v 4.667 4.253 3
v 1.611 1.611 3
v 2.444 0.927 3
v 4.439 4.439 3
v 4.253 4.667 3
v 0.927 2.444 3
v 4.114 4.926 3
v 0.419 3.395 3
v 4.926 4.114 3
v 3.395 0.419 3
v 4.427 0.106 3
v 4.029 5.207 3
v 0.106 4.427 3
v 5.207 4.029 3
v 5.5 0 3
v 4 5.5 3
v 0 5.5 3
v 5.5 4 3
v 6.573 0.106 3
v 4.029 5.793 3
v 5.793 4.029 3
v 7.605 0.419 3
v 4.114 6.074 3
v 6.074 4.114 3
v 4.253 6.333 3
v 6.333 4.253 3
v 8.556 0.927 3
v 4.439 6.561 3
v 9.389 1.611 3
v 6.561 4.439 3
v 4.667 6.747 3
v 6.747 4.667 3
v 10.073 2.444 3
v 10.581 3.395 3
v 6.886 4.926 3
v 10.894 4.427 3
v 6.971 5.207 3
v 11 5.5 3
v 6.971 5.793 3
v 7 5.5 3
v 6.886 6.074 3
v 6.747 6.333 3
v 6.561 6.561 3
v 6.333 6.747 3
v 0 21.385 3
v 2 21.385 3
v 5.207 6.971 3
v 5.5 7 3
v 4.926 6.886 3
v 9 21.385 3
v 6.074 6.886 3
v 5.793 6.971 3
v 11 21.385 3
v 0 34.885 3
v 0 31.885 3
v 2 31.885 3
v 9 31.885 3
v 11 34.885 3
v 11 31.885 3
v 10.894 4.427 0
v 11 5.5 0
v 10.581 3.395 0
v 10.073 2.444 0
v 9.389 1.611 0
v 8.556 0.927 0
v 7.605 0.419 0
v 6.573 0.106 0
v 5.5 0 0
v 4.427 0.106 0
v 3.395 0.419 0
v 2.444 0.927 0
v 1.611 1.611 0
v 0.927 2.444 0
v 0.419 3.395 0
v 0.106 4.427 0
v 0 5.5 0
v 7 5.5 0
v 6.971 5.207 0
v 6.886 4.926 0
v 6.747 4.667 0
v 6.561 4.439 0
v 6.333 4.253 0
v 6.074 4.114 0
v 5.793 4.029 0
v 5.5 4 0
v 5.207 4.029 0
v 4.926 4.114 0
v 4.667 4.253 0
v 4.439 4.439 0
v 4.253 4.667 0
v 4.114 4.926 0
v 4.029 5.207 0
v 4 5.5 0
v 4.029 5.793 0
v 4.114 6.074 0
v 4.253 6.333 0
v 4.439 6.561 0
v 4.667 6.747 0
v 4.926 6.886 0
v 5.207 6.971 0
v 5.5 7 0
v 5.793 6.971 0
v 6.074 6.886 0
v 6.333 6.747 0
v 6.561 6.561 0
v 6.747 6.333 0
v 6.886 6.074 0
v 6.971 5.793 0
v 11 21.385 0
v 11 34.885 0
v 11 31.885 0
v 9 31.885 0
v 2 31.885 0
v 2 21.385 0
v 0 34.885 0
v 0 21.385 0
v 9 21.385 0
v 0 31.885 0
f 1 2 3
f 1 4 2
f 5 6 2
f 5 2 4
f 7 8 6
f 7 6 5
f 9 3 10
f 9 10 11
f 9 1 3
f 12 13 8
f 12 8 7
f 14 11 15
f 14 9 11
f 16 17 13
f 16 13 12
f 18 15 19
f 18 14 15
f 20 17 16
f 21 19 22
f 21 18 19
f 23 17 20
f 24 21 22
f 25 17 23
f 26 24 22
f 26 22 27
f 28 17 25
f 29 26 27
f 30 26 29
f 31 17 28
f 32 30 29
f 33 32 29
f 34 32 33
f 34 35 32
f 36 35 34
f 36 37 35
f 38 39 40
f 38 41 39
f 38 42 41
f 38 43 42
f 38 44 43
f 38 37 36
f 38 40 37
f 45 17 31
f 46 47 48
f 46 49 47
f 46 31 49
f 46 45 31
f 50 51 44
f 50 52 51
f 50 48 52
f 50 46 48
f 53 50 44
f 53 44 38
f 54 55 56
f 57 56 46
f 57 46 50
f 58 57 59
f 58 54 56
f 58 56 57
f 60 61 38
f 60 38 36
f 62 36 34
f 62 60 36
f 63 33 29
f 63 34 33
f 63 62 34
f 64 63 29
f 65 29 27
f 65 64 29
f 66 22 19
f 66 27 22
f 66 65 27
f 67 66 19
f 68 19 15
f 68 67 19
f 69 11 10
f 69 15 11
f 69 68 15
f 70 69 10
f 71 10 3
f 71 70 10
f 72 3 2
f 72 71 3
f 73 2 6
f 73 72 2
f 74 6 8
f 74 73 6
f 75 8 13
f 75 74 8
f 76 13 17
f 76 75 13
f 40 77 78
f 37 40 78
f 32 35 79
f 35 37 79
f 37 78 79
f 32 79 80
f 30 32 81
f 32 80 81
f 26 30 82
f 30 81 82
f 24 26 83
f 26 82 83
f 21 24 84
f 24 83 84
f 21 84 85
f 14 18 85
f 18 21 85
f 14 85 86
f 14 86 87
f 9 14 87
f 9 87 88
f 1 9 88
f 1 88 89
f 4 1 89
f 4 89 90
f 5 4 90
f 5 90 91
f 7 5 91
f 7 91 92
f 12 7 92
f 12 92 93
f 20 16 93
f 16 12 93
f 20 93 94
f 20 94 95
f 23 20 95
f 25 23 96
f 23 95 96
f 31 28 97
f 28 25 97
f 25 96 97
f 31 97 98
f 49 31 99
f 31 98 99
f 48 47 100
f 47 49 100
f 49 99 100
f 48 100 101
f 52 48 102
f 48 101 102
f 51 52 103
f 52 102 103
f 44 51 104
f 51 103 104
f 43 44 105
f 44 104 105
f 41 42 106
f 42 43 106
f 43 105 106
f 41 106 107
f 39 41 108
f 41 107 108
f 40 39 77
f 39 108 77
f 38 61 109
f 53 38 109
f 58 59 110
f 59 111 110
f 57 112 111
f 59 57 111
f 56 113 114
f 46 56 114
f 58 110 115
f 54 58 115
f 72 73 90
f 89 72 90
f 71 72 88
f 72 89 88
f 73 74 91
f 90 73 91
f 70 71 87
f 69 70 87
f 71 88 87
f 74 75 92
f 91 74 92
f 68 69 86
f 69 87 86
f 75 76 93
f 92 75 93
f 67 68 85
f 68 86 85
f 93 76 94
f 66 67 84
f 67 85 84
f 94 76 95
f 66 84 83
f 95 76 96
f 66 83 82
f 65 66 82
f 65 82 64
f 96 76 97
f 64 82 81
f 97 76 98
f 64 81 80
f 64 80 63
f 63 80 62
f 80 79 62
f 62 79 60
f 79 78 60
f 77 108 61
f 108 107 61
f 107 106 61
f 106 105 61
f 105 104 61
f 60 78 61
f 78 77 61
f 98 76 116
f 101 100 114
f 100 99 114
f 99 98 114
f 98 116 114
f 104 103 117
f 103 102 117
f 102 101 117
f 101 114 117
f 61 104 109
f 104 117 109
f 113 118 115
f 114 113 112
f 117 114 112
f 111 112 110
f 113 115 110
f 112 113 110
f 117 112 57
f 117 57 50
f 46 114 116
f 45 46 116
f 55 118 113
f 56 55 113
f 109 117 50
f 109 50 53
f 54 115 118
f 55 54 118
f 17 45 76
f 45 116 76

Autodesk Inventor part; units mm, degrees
ref_plane "YZ Plane" through (0, 0, 0) normal (1, 0, 0) x (0, 1, 0)
ref_plane "XZ Plane" through (0, 0, 0) normal (0, 1, 0) x (-1, 0, 0)
ref_plane "XY Plane" through (0, 0, 0) normal (0, 0, 1) x (1, 0, 0)
sketch "Sketch6" plane through (0, 0, 0) normal (0, 0, 1) x (1, 0, 0)
  line L0 (11, 34.8851) -> (0, 34.8851)
  line L1 (2, 31.8851) -> (2, 21.3851)
  line L2 (9, 31.8851) -> (9, 21.3851)
  line L3 (2, 21.3851) -> (0, 21.3851)
  line L4 (9, 21.3851) -> (11, 21.3851)
  arc A0 (0, 5.5) -> (11, 5.5) centre (5.5, 5.5) ccw
  circle A1 centre (5.5, 5.5) radius 1.5
  line L5 (0, 31.8851) -> (2, 31.8851)
  line L6 (9, 31.8851) -> (11, 31.8851)
  line L7 (0, 34.8851) -> (0, 31.8851)
  line L8 (0, 21.3851) -> (0, 5.5)
  line L9 (11, 5.5) -> (11, 21.3851)
  line L10 (11, 31.8851) -> (11, 34.8851)
  point P0 (0, 0)
  point P1 (10, 21.3851)
  dimension "d92" = 10.5
  dimension "d93" = 10.5
  dimension "d94" = 2
  dimension "d95" = 2
  dimension "d96" = 3
  dimension "d97" = 11
  dimension "d98" = 15.8851
extrude "Extrusion3" add sketch "Sketch6" along normal blind 3
properties part number "4P.01.01.16-BC-v1-Final Flap L2 80deg" material "Acrylic, Clear"
